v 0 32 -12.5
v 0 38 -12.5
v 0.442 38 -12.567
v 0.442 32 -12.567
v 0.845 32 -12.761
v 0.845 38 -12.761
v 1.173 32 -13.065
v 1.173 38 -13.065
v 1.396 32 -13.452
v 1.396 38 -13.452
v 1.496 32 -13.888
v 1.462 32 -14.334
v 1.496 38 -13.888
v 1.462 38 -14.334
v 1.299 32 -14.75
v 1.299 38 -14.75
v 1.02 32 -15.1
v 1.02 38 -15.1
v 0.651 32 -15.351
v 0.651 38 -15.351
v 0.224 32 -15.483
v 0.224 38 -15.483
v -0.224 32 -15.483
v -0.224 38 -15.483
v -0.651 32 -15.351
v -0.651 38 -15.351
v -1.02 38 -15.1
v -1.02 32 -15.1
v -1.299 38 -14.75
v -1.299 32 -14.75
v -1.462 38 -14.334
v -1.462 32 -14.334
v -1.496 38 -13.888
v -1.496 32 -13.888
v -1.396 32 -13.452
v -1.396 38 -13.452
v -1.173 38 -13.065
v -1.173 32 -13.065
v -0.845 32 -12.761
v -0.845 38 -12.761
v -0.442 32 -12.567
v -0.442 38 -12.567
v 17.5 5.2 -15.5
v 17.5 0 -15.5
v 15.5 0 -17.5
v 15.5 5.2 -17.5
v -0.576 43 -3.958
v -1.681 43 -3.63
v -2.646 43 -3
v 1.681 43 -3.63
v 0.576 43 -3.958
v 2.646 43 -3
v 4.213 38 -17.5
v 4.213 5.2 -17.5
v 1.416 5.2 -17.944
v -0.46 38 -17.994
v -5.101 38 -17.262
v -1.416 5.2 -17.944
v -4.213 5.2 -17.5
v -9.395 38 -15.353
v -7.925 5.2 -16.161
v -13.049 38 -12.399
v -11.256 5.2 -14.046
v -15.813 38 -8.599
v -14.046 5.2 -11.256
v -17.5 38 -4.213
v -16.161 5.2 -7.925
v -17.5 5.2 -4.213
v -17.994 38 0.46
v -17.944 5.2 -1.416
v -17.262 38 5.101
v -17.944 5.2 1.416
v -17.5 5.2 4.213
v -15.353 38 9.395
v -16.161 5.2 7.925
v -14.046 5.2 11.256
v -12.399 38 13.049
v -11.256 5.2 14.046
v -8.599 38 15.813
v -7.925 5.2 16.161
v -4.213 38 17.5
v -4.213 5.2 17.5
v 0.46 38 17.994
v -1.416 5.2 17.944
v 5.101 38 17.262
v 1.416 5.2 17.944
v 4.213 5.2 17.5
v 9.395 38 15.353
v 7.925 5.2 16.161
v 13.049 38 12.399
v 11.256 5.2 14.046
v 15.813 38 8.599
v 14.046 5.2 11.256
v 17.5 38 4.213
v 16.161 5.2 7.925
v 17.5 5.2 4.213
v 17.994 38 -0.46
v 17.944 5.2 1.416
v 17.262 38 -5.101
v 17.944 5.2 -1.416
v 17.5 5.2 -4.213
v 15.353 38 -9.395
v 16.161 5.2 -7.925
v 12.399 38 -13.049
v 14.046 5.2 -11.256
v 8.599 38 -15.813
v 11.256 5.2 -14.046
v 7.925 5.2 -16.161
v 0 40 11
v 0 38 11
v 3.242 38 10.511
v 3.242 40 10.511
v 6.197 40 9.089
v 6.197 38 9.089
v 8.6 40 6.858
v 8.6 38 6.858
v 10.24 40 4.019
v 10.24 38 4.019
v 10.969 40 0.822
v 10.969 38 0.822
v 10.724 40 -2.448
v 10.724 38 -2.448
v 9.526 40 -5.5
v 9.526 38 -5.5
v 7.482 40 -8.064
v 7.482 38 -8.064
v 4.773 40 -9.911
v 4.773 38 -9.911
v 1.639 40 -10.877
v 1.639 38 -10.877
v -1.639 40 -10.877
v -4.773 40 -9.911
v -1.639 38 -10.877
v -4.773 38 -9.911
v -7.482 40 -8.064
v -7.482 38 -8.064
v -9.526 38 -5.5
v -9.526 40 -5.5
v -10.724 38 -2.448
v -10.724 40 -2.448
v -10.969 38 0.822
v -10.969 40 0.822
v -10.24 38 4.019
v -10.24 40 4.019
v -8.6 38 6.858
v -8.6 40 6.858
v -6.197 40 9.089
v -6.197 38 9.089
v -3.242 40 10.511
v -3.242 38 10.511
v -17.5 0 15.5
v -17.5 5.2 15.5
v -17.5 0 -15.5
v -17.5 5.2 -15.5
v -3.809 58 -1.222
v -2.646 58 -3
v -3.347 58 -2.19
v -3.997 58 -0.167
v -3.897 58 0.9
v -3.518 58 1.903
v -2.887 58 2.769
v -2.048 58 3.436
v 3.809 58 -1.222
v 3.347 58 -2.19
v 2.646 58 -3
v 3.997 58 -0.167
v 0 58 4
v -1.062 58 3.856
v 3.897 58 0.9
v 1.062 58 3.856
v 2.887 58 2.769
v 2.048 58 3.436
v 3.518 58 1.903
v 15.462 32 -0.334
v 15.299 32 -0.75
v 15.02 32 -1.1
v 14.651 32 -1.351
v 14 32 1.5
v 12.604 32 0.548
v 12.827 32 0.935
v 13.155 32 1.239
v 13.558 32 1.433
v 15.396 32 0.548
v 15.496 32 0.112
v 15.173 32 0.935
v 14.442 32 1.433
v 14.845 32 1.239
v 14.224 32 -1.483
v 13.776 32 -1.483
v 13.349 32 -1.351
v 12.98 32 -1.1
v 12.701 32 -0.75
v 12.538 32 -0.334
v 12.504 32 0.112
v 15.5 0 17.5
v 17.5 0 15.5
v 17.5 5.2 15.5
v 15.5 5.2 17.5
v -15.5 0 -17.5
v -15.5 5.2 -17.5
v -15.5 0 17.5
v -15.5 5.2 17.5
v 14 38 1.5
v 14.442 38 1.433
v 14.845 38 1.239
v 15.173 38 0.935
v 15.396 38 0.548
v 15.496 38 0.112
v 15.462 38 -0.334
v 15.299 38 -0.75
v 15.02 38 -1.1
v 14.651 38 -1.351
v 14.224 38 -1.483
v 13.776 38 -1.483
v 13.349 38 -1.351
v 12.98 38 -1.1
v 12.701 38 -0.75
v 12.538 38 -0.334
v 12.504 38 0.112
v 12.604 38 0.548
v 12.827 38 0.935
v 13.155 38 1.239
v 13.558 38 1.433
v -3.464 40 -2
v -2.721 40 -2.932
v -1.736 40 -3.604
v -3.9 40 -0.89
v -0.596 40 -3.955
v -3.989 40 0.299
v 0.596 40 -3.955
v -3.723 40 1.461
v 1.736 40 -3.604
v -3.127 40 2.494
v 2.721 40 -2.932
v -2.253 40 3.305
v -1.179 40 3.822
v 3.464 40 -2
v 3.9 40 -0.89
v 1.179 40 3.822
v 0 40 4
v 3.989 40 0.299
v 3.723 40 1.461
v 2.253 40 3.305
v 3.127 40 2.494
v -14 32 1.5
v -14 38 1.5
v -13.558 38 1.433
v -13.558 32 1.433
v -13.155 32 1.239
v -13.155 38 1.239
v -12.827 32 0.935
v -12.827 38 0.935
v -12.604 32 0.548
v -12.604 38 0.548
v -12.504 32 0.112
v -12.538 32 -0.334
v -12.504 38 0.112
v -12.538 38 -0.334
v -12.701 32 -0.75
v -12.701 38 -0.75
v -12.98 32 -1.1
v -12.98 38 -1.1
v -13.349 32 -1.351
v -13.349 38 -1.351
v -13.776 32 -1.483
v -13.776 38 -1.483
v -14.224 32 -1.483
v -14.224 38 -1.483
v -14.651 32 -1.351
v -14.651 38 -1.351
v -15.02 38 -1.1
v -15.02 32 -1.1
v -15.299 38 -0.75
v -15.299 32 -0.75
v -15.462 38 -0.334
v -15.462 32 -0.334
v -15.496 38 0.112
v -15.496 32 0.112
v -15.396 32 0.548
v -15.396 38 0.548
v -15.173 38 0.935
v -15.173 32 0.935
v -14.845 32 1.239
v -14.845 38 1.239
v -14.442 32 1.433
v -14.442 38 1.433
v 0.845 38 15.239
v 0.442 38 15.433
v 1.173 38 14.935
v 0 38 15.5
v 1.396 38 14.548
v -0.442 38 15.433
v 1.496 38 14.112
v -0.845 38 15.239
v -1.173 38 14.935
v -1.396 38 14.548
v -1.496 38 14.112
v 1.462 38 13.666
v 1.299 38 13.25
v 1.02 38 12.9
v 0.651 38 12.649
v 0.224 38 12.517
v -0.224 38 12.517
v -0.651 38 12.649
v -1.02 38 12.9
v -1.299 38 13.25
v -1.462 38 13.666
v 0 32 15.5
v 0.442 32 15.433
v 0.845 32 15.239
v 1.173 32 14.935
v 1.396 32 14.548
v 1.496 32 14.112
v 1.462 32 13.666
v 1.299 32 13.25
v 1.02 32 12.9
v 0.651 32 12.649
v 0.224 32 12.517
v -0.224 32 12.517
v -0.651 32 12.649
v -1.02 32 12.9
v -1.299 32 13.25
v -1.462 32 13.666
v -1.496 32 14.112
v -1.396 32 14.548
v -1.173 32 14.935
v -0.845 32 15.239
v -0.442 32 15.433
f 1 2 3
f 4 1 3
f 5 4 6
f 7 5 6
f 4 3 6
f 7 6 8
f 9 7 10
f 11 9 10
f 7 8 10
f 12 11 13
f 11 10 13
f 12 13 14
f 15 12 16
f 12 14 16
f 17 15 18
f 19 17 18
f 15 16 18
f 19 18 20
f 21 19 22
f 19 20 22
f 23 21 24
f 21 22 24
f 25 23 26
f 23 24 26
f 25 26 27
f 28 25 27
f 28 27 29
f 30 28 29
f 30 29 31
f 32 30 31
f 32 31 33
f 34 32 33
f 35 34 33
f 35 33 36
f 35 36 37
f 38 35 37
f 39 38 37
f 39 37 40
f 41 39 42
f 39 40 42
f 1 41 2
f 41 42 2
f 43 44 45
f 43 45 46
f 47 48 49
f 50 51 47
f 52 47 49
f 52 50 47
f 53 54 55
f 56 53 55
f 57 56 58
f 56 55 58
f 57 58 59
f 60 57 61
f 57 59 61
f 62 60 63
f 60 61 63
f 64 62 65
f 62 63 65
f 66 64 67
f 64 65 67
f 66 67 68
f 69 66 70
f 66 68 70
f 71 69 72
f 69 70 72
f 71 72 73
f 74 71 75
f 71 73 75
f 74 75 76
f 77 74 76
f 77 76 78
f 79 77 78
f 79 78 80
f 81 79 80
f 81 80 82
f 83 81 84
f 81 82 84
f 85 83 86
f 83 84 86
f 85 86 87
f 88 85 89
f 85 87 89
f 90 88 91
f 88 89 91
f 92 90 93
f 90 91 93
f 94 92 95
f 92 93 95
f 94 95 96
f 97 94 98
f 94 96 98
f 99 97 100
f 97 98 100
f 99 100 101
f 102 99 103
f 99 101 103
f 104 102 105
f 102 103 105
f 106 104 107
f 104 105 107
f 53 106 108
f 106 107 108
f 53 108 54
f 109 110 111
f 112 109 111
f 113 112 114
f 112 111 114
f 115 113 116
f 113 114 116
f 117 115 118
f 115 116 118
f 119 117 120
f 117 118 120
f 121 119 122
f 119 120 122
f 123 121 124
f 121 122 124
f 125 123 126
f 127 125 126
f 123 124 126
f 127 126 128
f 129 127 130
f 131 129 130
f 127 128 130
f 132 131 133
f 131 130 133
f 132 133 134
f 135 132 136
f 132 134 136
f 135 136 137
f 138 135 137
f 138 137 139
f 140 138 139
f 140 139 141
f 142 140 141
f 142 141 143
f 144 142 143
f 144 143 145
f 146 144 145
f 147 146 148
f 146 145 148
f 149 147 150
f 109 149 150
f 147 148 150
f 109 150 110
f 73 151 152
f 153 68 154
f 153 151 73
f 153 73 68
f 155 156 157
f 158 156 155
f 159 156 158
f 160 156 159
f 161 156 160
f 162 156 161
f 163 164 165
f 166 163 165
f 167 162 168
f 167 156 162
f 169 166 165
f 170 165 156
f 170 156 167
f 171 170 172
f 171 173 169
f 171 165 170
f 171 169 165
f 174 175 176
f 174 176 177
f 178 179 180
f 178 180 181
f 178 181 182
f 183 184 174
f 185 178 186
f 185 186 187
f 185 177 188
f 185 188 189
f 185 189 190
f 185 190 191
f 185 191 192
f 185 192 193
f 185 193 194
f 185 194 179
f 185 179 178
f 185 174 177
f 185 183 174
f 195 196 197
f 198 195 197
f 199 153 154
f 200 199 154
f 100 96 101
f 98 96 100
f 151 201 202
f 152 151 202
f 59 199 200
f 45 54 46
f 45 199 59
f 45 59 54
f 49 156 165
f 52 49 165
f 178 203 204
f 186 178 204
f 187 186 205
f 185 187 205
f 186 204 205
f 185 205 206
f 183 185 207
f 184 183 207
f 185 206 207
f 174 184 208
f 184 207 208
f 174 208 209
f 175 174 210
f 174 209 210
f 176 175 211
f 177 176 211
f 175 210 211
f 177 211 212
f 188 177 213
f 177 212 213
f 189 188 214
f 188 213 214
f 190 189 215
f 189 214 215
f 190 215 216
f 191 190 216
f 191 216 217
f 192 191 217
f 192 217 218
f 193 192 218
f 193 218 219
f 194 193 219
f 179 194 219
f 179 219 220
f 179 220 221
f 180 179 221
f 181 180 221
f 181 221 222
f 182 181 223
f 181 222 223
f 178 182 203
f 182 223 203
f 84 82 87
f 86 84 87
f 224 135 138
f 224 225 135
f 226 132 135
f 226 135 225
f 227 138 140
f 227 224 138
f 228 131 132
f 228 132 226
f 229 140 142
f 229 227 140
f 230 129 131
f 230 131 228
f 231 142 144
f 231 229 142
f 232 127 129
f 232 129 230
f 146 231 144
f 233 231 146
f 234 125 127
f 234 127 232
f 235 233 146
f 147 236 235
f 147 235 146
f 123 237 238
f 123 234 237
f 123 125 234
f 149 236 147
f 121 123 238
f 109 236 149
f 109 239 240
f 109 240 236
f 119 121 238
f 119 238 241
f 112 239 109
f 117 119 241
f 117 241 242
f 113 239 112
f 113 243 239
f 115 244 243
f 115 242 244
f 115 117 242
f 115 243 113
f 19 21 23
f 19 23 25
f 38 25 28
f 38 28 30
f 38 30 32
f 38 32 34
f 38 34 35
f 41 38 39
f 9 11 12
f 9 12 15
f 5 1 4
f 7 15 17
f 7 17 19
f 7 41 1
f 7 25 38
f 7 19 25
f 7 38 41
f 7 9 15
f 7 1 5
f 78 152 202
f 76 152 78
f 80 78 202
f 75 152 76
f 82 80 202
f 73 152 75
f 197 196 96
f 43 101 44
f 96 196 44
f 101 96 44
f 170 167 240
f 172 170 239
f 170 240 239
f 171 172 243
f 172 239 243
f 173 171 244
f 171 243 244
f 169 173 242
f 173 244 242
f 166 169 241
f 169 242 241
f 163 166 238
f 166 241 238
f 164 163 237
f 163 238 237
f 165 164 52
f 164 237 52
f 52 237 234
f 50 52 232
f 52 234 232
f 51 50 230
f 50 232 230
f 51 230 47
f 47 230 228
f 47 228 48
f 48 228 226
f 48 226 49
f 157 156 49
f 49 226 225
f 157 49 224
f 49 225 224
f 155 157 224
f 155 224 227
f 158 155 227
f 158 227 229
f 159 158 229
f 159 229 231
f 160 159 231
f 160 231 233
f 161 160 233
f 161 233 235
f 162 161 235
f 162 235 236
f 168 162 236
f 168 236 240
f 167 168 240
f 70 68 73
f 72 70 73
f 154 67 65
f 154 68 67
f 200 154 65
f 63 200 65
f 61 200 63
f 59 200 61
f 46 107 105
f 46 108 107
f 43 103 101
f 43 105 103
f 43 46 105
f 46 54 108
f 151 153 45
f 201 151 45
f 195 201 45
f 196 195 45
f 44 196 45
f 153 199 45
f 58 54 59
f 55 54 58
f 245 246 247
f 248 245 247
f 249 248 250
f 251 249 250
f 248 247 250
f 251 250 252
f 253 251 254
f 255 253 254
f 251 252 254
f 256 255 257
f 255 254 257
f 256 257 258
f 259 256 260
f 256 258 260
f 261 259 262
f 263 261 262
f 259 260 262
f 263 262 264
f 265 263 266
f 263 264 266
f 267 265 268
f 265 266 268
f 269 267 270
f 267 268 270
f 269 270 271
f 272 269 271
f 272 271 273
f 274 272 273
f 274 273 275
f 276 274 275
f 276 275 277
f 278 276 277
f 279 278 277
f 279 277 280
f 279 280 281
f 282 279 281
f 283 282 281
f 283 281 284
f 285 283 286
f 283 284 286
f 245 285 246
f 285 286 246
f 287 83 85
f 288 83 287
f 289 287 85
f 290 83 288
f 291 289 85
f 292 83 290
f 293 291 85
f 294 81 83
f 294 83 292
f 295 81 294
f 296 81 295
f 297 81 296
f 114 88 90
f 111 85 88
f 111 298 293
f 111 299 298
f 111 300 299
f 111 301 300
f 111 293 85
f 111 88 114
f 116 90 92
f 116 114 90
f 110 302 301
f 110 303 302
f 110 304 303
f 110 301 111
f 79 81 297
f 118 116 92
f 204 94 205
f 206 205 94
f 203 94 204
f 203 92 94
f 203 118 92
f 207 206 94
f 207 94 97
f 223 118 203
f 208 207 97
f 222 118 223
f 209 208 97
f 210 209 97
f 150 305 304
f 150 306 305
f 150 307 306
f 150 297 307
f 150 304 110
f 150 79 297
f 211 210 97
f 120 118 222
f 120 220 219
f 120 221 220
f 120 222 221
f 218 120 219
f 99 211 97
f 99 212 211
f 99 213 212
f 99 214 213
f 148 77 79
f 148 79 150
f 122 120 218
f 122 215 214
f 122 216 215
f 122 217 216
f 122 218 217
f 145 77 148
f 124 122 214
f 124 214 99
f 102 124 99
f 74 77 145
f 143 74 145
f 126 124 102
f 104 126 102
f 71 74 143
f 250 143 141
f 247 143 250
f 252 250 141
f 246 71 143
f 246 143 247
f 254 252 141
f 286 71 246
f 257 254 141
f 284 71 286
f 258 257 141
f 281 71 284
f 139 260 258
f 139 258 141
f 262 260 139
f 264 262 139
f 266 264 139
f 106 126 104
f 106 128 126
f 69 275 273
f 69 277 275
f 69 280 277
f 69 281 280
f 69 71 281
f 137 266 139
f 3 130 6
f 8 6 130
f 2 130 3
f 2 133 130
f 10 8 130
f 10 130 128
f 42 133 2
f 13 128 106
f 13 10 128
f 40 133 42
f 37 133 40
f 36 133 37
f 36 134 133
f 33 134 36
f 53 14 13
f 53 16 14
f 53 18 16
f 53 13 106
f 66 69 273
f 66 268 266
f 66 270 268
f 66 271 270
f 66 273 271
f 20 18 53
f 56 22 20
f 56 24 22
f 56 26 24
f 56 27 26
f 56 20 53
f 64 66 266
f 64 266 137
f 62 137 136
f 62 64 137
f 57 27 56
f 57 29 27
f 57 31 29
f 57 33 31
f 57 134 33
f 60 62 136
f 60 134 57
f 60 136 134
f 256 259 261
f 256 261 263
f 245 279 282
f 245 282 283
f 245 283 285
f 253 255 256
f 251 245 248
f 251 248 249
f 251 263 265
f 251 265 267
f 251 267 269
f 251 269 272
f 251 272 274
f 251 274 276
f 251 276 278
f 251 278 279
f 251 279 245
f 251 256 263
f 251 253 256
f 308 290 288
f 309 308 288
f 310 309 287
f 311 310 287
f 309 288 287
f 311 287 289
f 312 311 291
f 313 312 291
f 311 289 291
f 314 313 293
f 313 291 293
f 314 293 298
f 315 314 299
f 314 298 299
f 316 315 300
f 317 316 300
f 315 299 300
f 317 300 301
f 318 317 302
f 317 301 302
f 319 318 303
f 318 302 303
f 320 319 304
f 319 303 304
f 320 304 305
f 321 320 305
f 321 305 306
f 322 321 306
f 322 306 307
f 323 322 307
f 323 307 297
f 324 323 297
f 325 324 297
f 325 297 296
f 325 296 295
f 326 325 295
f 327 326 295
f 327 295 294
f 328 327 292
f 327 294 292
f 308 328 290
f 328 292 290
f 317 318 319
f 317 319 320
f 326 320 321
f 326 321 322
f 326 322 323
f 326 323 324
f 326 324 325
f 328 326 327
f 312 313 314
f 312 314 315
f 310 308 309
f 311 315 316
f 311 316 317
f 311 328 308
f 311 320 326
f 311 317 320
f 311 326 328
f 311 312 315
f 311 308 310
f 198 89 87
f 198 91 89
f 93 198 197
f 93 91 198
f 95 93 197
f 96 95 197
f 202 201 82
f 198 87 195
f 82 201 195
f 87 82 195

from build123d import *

# Parameters (mm, degrees)
SKETCH_1_W          = 35
SKETCH_1_H          = 35
EXTRUDE_1_DEPTH     = 5.2
SKETCH_2_R          = 18
EXTRUDE_2_DEPTH     = 32.8
SKETCH_3_R          = 11
EXTRUDE_3_DEPTH     = 2
SKETCH_4_R          = 4
EXTRUDE_4_DEPTH     = 18
SKETCH_5_W          = 10.54681648
SKETCH_5_H          = 7.766292135
CUT_EXTRUDE_1_DEPTH = 15
CHAMFER_1_SIZE      = 2
SKETCH_6_R          = 1.5
CUT_EXTRUDE_2_DEPTH = 6


with BuildPart() as part:
    # 草图1 → 凸台-拉伸1 (new body)
    with BuildSketch(Plane(origin=(0, 0, 0), x_dir=(1, 0, 0), z_dir=(0, 1, 0))):
        Rectangle(SKETCH_1_W, SKETCH_1_H)
    extrude(amount=EXTRUDE_1_DEPTH)

    # 草图2 → 凸台-拉伸2 (add)
    with BuildSketch(Plane(origin=(0, 5.2, 0), x_dir=(1, 0, 0), z_dir=(0, 1, 0))):
        with Locations(Location((0, 0, 0), (0, 0, 76.463797263))):
            Circle(SKETCH_2_R)
    extrude(amount=EXTRUDE_2_DEPTH)

    # 草图3 → 凸台-拉伸3 (add)
    with BuildSketch(Plane(origin=(0, 38, 0), x_dir=(1, 0, 0), z_dir=(0, 1, 0))):
        with Locations(Location((0, 0, 0), (0, 0, 270))):
            Circle(SKETCH_3_R)
    extrude(amount=EXTRUDE_3_DEPTH)

    # 草图4 → 凸台-拉伸4 (add)
    with BuildSketch(Plane(origin=(0, 40, 0), x_dir=(1, 0, 0), z_dir=(0, 1, 0))):
        with Locations(Location((0, 0, 0), (0, 0, 270))):
            Circle(SKETCH_4_R)
    extrude(amount=EXTRUDE_4_DEPTH)

    # 草图5 → 切除-拉伸1 (cut)
    with BuildSketch(Plane(origin=(0, 58, 0), x_dir=(1, 0, 0), z_dir=(0, 1, 0))):
        with Locations((0, 6.883146068)):
            Rectangle(SKETCH_5_W, SKETCH_5_H)
    extrude(amount=-CUT_EXTRUDE_1_DEPTH, mode=Mode.SUBTRACT)

    # 倒角1
    chamfer_1_edges = [part.edges().sort_by_distance(p)[0] for p in [
        (17.5, 2.6, 17.5),
        (-17.5, 2.6, 17.5),
        (-17.5, 2.6, -17.5),
        (17.5, 2.6, -17.5),
    ]]
    chamfer(chamfer_1_edges, length=CHAMFER_1_SIZE)

    # 草图6 → 切除-拉伸2 (cut)
    with BuildSketch(Plane(origin=(0, 38, 0), x_dir=(1, 0, 0), z_dir=(0, 1, 0))):
        with Locations(Location((0, 14, 0), (0, 0, 270))):
            Circle(SKETCH_6_R)
        with Locations(Location((14, 0, 0), (0, 0, 270))):
            Circle(SKETCH_6_R)
        with Locations(Location((0, -14, 0), (0, 0, 270))):
            Circle(SKETCH_6_R)
        with Locations(Location((-14, 0, 0), (0, 0, 270))):
            Circle(SKETCH_6_R)
    extrude(amount=-CUT_EXTRUDE_2_DEPTH, mode=Mode.SUBTRACT)


solid = part.part
